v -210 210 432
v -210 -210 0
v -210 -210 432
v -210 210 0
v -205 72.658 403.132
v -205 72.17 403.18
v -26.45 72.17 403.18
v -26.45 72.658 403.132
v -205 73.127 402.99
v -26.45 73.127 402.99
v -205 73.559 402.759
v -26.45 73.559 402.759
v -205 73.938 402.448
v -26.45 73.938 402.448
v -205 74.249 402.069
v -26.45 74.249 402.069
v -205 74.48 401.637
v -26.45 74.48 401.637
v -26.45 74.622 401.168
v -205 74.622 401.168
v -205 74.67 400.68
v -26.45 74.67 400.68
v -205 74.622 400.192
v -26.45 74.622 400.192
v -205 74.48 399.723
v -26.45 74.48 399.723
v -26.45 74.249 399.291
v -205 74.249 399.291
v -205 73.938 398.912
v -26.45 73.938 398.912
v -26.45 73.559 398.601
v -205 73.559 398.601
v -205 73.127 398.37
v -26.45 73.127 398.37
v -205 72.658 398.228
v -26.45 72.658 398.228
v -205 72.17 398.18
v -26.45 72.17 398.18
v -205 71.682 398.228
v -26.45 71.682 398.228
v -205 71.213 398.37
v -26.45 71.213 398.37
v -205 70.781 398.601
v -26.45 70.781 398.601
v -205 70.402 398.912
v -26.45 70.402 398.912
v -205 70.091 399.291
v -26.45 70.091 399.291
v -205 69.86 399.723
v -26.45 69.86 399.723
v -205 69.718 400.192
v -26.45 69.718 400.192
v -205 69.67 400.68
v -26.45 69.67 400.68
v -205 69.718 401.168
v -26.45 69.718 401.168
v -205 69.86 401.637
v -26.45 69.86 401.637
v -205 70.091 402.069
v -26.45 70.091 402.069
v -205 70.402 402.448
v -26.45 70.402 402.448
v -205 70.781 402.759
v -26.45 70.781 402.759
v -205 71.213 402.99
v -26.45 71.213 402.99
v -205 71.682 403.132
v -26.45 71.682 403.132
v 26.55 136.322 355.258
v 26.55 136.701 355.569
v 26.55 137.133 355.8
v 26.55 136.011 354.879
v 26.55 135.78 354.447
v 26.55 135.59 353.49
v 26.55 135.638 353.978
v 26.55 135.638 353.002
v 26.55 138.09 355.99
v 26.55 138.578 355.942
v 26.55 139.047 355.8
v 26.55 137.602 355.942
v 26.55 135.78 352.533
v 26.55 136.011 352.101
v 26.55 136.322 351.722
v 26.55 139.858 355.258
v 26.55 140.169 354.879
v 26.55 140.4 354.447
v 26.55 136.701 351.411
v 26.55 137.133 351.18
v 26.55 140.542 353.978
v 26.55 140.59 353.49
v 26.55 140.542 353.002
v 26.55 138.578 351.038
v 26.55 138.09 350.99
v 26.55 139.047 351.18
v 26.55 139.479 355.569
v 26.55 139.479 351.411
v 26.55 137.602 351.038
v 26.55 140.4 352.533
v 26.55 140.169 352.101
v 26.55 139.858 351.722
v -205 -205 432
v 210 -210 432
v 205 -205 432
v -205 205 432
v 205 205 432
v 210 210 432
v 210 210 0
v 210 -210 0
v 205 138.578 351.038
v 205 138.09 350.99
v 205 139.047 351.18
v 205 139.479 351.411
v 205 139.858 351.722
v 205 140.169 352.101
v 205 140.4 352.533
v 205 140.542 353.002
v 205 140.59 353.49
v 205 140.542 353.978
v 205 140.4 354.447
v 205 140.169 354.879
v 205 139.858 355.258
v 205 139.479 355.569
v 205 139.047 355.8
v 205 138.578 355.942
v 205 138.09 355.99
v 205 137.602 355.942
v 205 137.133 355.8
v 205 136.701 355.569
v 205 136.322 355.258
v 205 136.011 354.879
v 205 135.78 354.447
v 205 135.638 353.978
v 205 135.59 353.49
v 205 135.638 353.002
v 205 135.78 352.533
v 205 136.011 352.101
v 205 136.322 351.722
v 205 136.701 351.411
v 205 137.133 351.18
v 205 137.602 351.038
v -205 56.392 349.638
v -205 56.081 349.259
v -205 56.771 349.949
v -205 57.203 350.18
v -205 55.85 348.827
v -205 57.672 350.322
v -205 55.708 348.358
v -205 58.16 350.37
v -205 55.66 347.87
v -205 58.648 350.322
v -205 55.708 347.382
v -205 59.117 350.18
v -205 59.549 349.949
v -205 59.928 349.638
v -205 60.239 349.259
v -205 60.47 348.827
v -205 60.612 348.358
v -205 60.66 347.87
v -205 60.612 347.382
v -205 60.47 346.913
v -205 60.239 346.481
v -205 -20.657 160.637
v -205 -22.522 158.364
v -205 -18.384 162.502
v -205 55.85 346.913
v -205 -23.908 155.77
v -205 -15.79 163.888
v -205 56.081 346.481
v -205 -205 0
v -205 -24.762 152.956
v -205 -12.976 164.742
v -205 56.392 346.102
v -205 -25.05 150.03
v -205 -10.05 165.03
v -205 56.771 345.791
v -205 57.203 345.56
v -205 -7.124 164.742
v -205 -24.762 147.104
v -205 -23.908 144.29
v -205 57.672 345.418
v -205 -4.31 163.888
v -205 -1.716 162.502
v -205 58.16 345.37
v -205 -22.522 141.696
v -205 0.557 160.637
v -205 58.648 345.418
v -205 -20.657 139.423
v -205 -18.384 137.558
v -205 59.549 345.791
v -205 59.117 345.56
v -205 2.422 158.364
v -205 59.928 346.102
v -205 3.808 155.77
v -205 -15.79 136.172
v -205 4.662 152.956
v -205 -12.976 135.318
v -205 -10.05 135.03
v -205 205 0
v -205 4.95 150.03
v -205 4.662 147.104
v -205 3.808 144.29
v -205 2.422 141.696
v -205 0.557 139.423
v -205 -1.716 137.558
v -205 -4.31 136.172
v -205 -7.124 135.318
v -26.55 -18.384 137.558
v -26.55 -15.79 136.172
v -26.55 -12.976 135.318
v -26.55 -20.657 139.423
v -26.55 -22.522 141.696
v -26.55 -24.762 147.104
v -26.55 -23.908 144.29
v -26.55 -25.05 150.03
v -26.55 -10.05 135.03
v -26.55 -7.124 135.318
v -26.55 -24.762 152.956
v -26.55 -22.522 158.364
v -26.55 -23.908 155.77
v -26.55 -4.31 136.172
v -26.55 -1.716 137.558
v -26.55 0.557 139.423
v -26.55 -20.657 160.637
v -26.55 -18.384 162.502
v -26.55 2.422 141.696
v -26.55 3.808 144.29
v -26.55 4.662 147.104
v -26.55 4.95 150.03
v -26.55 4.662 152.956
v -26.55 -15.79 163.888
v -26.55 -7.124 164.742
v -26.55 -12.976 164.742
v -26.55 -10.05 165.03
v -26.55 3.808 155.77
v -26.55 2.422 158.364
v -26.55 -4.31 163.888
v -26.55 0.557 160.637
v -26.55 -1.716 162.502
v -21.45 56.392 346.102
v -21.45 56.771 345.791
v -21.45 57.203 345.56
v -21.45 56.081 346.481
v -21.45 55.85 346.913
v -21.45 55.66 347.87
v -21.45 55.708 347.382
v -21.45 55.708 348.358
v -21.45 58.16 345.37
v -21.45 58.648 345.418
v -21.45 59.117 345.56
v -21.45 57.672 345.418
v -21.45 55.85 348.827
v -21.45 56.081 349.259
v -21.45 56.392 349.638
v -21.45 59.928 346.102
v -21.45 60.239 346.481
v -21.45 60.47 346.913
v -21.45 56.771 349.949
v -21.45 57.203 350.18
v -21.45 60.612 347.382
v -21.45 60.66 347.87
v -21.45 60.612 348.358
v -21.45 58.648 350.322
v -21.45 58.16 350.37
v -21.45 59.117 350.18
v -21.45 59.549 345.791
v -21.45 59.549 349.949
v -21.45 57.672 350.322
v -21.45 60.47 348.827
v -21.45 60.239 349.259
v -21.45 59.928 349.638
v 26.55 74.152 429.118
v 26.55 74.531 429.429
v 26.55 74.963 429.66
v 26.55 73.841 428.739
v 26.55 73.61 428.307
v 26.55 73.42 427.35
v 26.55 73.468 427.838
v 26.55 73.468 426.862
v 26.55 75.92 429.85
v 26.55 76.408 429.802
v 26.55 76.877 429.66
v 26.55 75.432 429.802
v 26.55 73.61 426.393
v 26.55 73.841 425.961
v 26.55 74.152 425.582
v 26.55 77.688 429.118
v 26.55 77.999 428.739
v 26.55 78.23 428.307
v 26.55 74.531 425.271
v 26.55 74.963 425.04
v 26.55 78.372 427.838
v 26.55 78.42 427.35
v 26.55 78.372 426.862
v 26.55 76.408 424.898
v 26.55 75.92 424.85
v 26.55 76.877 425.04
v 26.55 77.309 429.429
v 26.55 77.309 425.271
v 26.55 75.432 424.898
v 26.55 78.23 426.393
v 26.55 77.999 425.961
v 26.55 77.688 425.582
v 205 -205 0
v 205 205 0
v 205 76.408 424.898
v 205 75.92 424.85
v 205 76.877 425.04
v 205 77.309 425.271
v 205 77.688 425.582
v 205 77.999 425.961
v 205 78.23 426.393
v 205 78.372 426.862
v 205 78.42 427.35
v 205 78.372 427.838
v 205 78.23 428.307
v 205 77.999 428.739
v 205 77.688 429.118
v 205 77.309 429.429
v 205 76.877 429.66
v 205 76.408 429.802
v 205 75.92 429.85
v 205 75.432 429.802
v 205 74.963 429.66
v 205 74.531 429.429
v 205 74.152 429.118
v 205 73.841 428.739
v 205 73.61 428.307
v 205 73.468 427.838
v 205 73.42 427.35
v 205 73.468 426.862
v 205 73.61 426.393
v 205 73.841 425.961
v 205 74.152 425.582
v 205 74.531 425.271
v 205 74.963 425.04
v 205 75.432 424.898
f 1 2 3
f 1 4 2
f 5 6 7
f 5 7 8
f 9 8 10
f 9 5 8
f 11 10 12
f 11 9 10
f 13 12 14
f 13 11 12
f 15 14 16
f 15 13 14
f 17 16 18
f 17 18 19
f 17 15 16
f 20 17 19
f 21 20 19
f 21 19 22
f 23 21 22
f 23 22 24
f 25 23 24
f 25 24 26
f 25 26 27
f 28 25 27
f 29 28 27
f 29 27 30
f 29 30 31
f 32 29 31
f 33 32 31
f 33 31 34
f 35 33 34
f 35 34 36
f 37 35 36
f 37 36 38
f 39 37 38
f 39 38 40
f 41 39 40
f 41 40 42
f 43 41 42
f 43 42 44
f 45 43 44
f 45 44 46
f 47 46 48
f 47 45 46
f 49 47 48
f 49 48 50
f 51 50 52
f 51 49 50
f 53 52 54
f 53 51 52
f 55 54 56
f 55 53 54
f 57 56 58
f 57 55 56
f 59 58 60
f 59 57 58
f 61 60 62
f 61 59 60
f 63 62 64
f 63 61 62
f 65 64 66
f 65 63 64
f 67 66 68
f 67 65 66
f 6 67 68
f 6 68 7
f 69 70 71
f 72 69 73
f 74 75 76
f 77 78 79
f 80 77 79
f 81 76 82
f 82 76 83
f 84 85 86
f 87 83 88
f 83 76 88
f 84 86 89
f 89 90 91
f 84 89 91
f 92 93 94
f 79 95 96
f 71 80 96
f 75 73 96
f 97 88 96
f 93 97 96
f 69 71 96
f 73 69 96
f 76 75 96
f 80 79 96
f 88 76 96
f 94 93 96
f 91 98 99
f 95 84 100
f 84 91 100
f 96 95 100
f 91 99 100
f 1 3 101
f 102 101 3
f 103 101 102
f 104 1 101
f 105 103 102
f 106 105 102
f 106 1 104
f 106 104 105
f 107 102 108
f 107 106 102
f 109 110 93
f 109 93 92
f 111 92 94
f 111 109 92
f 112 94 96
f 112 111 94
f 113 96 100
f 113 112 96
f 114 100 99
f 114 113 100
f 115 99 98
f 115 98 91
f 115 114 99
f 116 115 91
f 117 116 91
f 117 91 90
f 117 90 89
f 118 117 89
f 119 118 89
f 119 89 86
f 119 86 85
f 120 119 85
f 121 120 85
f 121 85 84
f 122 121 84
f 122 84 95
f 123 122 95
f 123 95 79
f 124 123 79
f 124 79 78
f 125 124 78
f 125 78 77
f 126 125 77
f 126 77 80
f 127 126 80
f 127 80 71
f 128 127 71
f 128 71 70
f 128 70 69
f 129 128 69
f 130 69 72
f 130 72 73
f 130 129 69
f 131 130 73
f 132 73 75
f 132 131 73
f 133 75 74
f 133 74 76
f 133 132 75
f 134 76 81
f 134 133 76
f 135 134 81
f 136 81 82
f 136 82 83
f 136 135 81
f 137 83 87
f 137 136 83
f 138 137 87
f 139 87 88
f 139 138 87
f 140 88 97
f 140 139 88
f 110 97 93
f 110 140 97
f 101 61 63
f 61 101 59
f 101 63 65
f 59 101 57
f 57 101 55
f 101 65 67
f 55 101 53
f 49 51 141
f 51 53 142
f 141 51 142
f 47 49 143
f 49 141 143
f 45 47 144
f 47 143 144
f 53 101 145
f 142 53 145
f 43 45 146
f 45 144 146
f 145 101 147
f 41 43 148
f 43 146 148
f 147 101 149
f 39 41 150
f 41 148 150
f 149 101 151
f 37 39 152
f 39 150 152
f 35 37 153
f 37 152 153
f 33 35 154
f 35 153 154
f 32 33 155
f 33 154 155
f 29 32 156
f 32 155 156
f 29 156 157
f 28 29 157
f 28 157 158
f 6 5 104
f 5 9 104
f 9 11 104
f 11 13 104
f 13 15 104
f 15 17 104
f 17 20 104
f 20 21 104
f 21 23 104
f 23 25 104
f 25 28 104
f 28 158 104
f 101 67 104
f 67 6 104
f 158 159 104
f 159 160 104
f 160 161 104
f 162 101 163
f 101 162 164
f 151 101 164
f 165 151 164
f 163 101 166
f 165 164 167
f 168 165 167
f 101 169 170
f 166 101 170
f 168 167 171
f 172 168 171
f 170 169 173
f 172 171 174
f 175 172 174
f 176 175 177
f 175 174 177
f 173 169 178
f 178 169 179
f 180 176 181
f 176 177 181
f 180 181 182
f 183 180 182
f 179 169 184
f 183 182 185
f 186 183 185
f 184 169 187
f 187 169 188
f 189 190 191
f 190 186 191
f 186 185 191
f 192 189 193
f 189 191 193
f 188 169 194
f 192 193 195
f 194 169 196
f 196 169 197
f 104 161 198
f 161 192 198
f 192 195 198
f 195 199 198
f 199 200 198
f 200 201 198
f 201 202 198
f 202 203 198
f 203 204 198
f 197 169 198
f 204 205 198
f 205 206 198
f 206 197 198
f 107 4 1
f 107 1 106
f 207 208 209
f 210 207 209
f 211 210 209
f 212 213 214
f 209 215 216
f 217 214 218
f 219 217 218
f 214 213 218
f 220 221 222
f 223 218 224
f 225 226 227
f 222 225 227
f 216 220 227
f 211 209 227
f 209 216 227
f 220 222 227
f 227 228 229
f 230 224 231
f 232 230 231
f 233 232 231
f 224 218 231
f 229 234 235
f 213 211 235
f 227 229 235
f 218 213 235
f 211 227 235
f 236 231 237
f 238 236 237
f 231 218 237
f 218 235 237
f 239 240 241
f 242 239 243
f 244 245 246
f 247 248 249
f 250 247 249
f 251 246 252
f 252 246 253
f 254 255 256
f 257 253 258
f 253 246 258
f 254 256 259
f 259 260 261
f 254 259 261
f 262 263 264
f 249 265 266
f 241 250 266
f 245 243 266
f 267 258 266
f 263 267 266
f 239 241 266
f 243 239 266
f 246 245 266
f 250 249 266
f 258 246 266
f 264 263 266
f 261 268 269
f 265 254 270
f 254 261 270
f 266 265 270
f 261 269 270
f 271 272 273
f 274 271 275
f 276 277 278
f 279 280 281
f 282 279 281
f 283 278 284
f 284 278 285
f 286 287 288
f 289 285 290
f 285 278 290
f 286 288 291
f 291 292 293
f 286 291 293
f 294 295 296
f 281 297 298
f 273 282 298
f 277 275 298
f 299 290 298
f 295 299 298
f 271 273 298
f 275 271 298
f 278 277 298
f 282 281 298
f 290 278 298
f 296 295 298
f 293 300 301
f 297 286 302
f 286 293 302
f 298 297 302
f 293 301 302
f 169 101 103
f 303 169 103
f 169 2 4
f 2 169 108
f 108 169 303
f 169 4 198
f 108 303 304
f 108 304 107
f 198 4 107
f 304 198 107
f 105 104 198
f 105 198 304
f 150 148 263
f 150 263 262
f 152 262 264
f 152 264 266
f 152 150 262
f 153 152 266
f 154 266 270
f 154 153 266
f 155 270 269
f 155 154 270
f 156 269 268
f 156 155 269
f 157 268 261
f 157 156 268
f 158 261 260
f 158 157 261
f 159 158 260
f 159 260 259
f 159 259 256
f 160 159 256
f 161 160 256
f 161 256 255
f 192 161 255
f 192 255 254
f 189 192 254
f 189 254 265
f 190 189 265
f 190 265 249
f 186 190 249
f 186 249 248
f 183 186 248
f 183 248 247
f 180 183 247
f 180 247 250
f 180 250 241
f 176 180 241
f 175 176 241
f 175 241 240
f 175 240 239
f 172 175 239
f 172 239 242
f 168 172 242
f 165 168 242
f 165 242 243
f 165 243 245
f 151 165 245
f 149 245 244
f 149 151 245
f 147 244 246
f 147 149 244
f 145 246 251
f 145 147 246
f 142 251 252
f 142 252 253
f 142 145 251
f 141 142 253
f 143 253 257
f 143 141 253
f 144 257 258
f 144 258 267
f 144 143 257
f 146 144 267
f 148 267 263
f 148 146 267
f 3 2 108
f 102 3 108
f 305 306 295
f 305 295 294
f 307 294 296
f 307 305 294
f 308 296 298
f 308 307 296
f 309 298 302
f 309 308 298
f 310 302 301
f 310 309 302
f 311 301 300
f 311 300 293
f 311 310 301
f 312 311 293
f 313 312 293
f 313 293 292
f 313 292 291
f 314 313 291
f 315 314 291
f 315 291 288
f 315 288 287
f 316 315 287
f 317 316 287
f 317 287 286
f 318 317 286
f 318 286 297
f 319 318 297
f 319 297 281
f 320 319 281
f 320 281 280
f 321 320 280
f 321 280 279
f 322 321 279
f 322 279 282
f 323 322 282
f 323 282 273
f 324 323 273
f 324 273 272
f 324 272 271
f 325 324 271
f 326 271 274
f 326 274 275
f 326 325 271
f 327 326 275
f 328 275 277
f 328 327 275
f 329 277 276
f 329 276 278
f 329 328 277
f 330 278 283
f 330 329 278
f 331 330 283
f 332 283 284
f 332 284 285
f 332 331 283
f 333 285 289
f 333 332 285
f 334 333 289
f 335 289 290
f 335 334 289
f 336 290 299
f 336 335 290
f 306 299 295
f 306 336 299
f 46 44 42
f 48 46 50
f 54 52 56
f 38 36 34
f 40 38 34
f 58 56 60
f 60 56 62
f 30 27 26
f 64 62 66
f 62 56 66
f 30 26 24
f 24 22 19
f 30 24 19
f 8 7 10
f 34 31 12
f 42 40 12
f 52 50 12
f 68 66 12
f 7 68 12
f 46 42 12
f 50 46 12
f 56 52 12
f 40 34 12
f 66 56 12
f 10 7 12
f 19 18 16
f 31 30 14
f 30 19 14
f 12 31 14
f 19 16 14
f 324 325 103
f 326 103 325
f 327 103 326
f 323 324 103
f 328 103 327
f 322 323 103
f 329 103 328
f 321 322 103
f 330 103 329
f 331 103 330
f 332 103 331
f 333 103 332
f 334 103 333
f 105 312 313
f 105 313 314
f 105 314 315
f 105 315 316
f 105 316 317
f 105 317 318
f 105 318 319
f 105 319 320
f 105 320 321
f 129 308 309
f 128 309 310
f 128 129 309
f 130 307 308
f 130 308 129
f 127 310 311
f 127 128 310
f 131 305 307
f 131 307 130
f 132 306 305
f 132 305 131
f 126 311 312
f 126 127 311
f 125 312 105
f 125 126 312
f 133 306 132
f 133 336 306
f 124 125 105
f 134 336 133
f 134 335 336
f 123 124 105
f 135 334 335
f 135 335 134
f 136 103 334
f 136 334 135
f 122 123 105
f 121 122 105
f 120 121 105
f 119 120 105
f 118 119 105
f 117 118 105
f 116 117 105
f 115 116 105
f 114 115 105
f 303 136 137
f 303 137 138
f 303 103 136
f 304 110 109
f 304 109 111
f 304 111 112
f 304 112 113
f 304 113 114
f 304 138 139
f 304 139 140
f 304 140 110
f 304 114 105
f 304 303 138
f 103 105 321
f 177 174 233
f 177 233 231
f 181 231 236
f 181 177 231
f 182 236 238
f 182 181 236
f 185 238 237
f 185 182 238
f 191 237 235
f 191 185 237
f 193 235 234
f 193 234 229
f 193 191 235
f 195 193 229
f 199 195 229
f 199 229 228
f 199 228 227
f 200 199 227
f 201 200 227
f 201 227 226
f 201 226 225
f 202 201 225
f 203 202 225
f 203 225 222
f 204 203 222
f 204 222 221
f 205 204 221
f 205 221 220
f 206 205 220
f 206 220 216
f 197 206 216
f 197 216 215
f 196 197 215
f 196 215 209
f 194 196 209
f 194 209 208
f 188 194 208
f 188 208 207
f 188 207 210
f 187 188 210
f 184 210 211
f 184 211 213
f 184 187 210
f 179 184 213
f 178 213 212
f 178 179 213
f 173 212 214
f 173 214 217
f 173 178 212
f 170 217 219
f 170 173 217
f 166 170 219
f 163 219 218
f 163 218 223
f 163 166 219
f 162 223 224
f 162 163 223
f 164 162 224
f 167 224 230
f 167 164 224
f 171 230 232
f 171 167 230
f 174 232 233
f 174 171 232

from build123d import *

# Parameters (mm, degrees)
ESBO_O1_W                = 420
ESBO_O1_H                = 420
ESBO_O1_W_2              = 410
ESBO_O1_H_2              = 410
RESSALTO_EXTRUS_O1_DEPTH = 432
ESBO_O4_R                = 2.5
RESSALTO_EXTRUS_O4_DEPTH = 183.55
ESBO_O4_4_R              = 2.5
RESSALTO_EXTRUS_O5_DEPTH = 188.55
ESBO_O5_R                = 2.5
RESSALTO_EXTRUS_O6_DEPTH = 183.45
ESBO_O6_R                = 15
RESSALTO_EXTRUS_O7_DEPTH = 183.45


with BuildPart() as part:
    # Esboço1 → Ressalto-extrusão1 (new body)
    with BuildSketch(Plane.XY):
        Rectangle(ESBO_O1_W, ESBO_O1_H)
        Rectangle(ESBO_O1_W_2, ESBO_O1_H_2, mode=Mode.SUBTRACT)
    extrude(amount=RESSALTO_EXTRUS_O1_DEPTH)

    # Esboço4 → Ressalto-extrusão4 (add)
    with BuildSketch(Plane.ZY.offset(210)):
        with Locations((400.68, 72.17)):
            Circle(ESBO_O4_R)
    extrude(amount=-RESSALTO_EXTRUS_O4_DEPTH)

    # Esboço4<4> → Ressalto-extrusão5 (add)
    with BuildSketch(Plane.ZY.offset(210)):
        with Locations((347.87, 58.16)):
            Circle(ESBO_O4_4_R)
    extrude(amount=-RESSALTO_EXTRUS_O5_DEPTH)

    # Esboço5 → Ressalto-extrusão6 (add)
    with BuildSketch(Plane(origin=(210, 0, 0), x_dir=(0, 0, -1), z_dir=(1, 0, 0))):
        with Locations((-353.49, 138.09)):
            Circle(ESBO_O5_R)
        with Locations((-427.35, 75.92)):
            Circle(ESBO_O5_R)
    extrude(amount=-RESSALTO_EXTRUS_O6_DEPTH)

    # Esboço6 → Ressalto-extrusão7 (add)
    with BuildSketch(Plane.ZY.offset(210)):
        with Locations((150.03, -10.05)):
            Circle(ESBO_O6_R)
    extrude(amount=-RESSALTO_EXTRUS_O7_DEPTH)


solid = part.part
